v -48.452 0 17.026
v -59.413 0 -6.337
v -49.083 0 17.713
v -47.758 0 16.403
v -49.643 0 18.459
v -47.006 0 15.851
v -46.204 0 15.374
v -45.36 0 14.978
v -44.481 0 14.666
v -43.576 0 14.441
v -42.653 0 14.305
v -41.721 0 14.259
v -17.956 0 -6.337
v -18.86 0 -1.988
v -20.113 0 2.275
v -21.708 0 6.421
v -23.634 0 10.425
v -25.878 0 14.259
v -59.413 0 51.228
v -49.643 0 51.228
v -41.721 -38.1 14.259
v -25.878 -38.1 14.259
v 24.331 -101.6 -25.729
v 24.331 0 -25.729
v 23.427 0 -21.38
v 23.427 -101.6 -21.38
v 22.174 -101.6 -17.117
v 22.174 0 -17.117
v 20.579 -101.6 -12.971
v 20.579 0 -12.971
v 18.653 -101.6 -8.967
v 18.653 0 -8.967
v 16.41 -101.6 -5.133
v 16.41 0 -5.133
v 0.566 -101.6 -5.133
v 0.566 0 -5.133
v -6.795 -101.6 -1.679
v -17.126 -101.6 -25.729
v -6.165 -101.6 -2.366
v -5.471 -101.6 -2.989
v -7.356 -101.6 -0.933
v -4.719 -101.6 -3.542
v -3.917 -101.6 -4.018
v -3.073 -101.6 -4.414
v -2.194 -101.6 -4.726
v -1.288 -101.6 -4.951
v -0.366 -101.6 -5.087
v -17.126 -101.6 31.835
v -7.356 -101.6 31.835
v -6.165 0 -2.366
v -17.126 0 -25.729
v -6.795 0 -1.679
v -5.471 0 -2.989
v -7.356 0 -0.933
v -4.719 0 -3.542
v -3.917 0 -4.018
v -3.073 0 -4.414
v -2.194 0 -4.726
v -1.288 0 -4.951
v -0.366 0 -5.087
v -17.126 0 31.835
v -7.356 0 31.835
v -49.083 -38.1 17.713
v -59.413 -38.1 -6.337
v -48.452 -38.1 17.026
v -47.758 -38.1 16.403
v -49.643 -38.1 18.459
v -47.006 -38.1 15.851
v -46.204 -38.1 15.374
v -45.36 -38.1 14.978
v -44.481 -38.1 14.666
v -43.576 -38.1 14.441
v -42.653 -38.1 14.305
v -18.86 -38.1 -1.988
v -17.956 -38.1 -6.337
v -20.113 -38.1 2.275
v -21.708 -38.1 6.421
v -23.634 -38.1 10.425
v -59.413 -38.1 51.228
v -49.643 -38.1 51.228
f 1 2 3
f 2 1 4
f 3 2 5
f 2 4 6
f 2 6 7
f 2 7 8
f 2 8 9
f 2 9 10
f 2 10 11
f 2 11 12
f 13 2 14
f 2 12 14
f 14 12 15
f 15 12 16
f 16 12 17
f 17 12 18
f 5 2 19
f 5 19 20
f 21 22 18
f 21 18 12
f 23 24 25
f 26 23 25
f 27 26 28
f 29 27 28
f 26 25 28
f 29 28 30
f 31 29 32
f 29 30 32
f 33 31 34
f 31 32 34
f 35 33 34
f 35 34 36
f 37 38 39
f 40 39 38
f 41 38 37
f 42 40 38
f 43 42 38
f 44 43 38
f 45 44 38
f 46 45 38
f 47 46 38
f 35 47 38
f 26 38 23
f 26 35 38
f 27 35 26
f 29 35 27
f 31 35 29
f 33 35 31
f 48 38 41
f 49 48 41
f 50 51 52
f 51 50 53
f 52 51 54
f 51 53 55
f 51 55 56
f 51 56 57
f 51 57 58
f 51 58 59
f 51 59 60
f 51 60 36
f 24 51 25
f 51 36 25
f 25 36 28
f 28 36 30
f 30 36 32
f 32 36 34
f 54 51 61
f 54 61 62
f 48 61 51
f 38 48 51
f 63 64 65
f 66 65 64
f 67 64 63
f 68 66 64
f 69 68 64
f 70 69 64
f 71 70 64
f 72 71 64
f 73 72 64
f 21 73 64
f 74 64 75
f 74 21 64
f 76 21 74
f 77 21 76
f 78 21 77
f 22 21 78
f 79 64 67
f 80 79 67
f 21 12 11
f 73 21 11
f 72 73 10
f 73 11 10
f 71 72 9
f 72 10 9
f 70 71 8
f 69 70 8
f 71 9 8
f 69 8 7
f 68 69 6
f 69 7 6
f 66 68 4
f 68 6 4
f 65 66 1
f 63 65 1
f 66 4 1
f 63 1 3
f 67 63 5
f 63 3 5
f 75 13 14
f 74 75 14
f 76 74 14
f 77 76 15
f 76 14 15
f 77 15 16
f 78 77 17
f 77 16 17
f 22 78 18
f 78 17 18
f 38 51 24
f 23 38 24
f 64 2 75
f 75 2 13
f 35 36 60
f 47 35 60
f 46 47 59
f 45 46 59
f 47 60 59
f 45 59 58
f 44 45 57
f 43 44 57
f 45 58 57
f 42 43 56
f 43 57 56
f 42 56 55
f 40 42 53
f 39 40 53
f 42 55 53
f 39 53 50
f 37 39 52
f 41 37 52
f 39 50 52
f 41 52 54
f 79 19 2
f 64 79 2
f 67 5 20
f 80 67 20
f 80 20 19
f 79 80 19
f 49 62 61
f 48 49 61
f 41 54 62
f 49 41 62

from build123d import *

# Parameters (mm, degrees)
F1_DEPTH = 38.1
F3_DEPTH = 101.6


with BuildPart() as f1:
    # F0 (on Front) → F1 (new body)
    with BuildSketch(Plane.XZ):
        with BuildLine():
            ThreePointArc((-49.64317, 37.760496), (-52.291704, 44.494011), (-49.64317, 51.227525))
            Line((-49.64317, 51.227525), (-59.413366, 51.227525))
            Line((-59.413366, 51.227525), (-59.413366, -6.337426))
            Line((-59.413366, -6.337426), (-25.877822, -6.337426))
            Line((-25.877822, -6.337426), (-17.956039, -6.337426))
            ThreePointArc((-17.956039, -6.337426), (-20.86875, 4.364038), (-25.877822, 14.259209))
            Line((-25.877822, 14.259209), (-41.721389, 14.259209))
            ThreePointArc((-41.721389, 14.259209), (-46.204425, 15.374006), (-49.64317, 18.458712))
            Line((-49.64317, 18.458712), (-49.64317, 37.760496))
        make_face()
        with BuildLine():
            Line((-49.64317, 37.760496), (-49.64317, 51.227525))
            ThreePointArc((-49.64317, 51.227525), (-52.291704, 44.494011), (-49.64317, 37.760496))
        make_face()
    extrude(amount=F1_DEPTH)


with BuildPart() as f3:
    # F2 (on Front) → F3 (new body)
    with BuildSketch(Plane.XZ):
        with BuildLine():
            ThreePointArc((-7.355777, 18.368443), (-10.004311, 25.101957), (-7.355777, 31.835472))
            Line((-7.355777, 31.835472), (-17.125973, 31.835472))
            Line((-17.125973, 31.835472), (-17.125973, -25.729479))
            Line((-17.125973, -25.729479), (16.40957, -25.729479))
            Line((16.40957, -25.729479), (24.331354, -25.729479))
            ThreePointArc((24.331354, -25.729479), (21.418643, -15.028015), (16.40957, -5.132844))
            Line((16.40957, -5.132844), (0.566004, -5.132844))
            ThreePointArc((0.566004, -5.132844), (-3.917032, -4.018047), (-7.355777, -0.933341))
            Line((-7.355777, -0.933341), (-7.355777, 18.368443))
        make_face()
        with BuildLine():
            Line((-7.355777, 18.368443), (-7.355777, 31.835472))
            ThreePointArc((-7.355777, 31.835472), (-10.004311, 25.101957), (-7.355777, 18.368443))
        make_face()
    extrude(amount=F3_DEPTH)


solid = Compound([f1.part, f3.part])
